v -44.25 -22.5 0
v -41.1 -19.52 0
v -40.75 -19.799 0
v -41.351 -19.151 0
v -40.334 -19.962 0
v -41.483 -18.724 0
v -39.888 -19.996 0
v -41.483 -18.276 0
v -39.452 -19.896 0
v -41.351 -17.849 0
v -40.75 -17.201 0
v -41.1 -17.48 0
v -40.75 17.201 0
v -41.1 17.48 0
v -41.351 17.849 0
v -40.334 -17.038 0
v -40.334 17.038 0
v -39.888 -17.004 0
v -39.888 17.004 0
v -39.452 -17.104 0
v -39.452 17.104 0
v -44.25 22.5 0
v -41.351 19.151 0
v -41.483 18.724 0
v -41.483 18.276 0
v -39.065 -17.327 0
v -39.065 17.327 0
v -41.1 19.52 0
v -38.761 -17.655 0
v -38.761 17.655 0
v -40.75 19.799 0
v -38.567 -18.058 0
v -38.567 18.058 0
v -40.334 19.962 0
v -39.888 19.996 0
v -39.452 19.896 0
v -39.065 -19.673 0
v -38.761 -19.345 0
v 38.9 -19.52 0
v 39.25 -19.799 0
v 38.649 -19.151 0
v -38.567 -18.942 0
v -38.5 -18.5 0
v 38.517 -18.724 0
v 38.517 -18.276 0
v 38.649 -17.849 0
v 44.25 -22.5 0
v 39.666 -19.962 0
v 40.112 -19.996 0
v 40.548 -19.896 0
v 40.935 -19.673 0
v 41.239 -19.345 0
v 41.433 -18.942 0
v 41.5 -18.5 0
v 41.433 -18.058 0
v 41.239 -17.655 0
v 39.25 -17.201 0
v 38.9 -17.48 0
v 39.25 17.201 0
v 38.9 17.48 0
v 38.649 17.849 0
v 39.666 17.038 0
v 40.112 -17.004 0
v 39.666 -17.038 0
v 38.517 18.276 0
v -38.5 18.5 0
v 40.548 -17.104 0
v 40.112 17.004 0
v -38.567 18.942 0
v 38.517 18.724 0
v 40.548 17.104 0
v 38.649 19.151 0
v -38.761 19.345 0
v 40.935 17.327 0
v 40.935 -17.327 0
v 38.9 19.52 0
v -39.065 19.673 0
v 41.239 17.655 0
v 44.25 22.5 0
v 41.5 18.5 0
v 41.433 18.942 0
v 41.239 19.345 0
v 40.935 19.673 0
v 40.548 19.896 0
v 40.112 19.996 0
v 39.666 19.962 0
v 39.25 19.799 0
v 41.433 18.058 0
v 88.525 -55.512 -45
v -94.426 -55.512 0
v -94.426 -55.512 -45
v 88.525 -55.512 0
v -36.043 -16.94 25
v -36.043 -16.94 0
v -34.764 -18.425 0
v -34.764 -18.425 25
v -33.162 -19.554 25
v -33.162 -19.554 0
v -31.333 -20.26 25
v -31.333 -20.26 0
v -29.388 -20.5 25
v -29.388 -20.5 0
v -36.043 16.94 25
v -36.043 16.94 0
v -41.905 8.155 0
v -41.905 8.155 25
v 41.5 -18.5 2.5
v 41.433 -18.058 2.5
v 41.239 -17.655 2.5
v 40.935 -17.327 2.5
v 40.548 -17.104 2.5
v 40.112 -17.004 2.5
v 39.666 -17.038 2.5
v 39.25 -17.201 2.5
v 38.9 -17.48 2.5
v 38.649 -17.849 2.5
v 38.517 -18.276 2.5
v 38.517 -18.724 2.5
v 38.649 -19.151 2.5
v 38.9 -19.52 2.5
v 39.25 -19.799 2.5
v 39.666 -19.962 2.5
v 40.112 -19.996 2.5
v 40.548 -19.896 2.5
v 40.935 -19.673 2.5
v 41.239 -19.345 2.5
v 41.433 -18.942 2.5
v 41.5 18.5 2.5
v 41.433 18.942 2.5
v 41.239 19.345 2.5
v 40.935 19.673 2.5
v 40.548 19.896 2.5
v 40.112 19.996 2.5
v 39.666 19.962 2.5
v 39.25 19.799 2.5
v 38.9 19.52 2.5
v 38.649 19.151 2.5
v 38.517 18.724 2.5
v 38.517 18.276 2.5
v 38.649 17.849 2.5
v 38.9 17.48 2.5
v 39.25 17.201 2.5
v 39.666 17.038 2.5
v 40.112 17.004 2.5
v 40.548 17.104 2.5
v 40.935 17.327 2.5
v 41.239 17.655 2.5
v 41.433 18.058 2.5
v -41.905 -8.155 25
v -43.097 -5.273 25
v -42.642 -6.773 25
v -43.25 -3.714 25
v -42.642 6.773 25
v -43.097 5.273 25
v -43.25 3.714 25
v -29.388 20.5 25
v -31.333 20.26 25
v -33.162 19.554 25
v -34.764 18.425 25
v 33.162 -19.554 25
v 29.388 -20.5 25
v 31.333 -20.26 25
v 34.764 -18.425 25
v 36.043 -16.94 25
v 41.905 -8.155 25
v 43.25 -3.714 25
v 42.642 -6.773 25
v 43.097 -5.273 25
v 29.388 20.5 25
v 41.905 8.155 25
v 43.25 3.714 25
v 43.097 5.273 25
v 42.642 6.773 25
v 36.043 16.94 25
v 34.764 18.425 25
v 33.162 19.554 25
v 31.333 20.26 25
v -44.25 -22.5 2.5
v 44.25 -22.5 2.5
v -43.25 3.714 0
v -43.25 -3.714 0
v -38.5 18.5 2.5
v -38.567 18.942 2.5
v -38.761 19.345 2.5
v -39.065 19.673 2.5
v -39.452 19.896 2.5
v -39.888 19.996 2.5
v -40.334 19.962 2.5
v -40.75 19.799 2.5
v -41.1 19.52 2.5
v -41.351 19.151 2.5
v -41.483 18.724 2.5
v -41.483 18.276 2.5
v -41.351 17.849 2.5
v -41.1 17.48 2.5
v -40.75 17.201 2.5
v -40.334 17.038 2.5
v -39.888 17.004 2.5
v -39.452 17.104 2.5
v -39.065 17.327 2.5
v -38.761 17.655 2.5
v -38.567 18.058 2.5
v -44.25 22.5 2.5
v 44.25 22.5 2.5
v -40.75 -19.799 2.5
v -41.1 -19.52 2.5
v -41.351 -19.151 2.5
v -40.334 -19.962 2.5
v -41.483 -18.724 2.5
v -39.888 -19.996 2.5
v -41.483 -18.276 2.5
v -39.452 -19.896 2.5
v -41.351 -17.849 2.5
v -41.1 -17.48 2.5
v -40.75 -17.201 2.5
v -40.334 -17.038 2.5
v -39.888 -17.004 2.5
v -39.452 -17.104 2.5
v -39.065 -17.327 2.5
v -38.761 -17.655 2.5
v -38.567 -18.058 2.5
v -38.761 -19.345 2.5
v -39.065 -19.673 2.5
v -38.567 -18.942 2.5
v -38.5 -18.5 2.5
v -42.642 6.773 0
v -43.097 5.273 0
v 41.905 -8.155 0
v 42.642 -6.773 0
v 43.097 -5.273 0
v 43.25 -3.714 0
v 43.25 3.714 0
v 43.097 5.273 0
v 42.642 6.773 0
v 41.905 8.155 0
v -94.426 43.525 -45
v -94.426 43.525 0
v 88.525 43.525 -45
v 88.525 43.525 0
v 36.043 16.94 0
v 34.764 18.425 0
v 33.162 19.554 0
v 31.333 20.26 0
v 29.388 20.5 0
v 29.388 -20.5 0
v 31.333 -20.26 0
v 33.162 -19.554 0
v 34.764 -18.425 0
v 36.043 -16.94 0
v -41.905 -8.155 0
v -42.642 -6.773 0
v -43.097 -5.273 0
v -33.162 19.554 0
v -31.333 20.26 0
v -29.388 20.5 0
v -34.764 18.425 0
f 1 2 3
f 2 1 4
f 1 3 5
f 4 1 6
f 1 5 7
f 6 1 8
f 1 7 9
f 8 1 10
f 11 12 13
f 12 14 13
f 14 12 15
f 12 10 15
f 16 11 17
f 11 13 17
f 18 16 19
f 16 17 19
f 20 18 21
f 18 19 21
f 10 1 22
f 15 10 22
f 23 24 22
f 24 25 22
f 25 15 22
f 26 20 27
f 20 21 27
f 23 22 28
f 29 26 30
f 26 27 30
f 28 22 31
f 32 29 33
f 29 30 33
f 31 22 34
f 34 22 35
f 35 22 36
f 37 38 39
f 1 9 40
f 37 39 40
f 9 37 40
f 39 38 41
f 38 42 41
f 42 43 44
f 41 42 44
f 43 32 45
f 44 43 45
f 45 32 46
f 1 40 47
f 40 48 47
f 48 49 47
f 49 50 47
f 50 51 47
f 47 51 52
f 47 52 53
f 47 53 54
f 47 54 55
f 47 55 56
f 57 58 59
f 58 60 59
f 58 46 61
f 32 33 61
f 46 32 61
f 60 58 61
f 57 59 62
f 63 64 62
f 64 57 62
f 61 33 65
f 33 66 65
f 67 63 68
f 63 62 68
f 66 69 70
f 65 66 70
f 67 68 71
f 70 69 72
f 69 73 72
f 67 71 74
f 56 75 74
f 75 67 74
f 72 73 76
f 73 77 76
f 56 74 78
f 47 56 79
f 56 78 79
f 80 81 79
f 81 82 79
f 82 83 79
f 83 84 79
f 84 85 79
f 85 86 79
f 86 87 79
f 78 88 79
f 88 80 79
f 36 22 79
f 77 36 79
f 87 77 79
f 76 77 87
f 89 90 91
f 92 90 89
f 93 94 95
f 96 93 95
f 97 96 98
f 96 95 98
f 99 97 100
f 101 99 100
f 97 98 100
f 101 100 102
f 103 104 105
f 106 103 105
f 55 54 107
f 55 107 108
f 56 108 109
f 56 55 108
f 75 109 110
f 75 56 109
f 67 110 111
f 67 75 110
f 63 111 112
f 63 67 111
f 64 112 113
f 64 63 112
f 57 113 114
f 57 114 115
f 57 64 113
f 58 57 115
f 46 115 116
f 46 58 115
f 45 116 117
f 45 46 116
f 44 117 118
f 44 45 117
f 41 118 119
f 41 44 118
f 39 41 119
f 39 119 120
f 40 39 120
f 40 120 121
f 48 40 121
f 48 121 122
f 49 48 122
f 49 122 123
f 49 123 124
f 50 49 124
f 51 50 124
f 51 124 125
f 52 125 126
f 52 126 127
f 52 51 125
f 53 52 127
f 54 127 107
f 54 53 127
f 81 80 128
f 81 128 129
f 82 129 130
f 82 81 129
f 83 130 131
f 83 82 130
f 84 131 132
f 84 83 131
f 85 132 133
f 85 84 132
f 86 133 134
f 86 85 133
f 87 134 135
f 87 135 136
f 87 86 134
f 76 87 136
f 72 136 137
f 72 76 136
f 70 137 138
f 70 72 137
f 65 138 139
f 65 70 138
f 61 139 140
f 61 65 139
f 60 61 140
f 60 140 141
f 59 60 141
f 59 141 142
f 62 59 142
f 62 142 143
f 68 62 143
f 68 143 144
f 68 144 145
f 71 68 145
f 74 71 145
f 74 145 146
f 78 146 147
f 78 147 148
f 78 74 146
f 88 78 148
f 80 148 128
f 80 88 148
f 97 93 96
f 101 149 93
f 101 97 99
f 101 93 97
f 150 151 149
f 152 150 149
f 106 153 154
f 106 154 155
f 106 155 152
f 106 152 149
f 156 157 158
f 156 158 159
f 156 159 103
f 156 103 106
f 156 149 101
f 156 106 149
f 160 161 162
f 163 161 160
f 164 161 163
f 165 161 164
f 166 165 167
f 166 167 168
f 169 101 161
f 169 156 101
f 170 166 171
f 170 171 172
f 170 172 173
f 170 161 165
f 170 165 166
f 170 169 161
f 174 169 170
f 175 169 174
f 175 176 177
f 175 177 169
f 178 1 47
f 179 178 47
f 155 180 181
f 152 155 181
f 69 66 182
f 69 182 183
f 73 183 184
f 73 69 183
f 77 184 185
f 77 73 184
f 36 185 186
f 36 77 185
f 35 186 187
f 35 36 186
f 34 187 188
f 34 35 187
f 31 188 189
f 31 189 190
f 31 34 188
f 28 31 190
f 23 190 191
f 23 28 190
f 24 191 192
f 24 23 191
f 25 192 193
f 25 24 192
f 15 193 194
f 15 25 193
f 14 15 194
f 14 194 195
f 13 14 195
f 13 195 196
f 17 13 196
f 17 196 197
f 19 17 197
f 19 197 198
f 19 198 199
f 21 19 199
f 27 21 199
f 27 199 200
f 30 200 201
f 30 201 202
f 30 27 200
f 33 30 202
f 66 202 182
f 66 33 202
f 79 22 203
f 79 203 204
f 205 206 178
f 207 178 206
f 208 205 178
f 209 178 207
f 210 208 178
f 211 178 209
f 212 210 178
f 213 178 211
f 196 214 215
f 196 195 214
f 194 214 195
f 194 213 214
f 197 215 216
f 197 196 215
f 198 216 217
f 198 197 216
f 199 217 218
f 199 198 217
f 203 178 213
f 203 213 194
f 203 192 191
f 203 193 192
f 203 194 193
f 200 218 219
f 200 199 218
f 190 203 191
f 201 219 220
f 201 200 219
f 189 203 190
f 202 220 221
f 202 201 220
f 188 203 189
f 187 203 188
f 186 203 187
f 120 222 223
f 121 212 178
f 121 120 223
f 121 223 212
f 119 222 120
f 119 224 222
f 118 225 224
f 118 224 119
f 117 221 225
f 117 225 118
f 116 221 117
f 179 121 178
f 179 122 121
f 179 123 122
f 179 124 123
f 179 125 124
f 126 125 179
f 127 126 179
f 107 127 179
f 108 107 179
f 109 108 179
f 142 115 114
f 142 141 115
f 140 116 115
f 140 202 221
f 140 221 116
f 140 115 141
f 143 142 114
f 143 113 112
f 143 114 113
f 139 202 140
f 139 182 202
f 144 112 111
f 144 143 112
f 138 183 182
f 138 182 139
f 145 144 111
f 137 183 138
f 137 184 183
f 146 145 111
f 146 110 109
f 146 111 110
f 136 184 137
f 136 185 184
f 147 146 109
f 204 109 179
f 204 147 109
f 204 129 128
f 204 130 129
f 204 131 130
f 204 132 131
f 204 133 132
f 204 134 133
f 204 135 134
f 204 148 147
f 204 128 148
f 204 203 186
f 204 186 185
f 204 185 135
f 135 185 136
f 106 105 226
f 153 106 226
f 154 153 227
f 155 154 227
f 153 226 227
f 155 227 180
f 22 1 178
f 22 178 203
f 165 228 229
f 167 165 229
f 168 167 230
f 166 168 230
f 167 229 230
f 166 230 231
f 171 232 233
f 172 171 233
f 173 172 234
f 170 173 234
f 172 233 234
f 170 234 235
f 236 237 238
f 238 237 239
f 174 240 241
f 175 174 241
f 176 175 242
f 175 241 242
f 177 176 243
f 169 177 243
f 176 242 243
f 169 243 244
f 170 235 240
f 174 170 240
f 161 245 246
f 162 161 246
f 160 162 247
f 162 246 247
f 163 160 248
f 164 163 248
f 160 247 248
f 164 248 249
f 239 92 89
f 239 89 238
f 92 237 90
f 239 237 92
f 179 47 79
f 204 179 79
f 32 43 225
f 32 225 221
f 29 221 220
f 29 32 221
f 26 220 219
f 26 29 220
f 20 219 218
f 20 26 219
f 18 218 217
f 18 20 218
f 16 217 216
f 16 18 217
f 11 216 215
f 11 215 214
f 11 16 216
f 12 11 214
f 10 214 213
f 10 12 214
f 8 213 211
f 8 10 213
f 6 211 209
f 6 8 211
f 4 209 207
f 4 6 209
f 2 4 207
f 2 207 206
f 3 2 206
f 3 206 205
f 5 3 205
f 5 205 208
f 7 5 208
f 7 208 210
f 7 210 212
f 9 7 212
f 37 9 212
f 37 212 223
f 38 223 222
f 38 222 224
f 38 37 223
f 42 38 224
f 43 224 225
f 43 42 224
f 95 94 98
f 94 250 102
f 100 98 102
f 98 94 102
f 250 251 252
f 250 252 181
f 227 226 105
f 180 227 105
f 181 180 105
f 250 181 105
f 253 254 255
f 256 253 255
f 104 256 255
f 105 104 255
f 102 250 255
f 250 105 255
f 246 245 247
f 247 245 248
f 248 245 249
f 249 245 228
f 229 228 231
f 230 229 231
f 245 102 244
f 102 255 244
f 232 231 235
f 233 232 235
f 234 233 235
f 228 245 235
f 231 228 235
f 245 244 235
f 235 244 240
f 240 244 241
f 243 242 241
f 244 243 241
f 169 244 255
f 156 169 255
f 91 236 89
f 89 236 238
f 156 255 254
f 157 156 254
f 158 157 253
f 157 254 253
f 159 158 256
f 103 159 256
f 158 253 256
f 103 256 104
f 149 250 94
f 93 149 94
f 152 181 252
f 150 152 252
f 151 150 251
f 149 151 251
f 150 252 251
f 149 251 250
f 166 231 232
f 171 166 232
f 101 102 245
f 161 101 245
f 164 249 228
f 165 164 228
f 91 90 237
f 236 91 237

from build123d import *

# Parameters (mm, degrees)
F0_W     = 182.950832
F0_H     = 99.036887
F1_DEPTH = 45
F4_W     = 88.5
F4_H     = 45
F4_R     = 1.5
F5_DEPTH = 2.5
F6_DEPTH = 25


with BuildPart() as f1:
    # F0 (on Top) → F1 (new body)
    with BuildSketch(Plane.XY):
        with Locations((-2.950821, -5.993854)):
            Rectangle(F0_W, F0_H)
    extrude(amount=-F1_DEPTH)


with BuildPart() as f5:
    # F4 (on Top) → F5 (new body)
    with BuildSketch(Plane.XY):
        Rectangle(F4_W, F4_H)
        with Locations((-40, -18.5)):
            Circle(F4_R, mode=Mode.SUBTRACT)
        with Locations((40, -18.5)):
            Circle(F4_R, mode=Mode.SUBTRACT)
        with Locations((-40, 18.5)):
            Circle(F4_R, mode=Mode.SUBTRACT)
        with Locations((40, 18.5)):
            Circle(F4_R, mode=Mode.SUBTRACT)
    extrude(amount=F5_DEPTH)


with BuildPart() as f6:
    # F3 (on Top) → F6 (new body)
    with BuildSketch(Plane.XY):
        with BuildLine():
            Line((29.38816, 20.5), (-29.38816, 20.5))
            ThreePointArc((-29.38816, 20.5), (-33.161684, 19.554114), (-36.042876, 16.94013))
            Line((-36.042876, 16.94013), (-41.904716, 8.154604))
            ThreePointArc((-41.904716, 8.154604), (-42.906296, 6.034202), (-43.25, 3.714474))
            Line((-43.25, 3.714474), (-43.25, -3.714474))
            ThreePointArc((-43.25, -3.714474), (-42.906296, -6.034202), (-41.904716, -8.154604))
            Line((-41.904716, -8.154604), (-36.042876, -16.94013))
            ThreePointArc((-36.042876, -16.94013), (-33.161684, -19.554114), (-29.38816, -20.5))
            Line((-29.38816, -20.5), (29.38816, -20.5))
            ThreePointArc((29.38816, -20.5), (33.161684, -19.554114), (36.042876, -16.94013))
            Line((36.042876, -16.94013), (41.904716, -8.154604))
            ThreePointArc((41.904716, -8.154604), (42.906296, -6.034202), (43.25, -3.714474))
            Line((43.25, -3.714474), (43.25, 3.714474))
            ThreePointArc((43.25, 3.714474), (42.906296, 6.034202), (41.904716, 8.154604))
            Line((41.904716, 8.154604), (36.042876, 16.94013))
            ThreePointArc((36.042876, 16.94013), (33.161684, 19.554114), (29.38816, 20.5))
        make_face()
    extrude(amount=F6_DEPTH)


solid = Compound([f1.part, f5.part, f6.part])
